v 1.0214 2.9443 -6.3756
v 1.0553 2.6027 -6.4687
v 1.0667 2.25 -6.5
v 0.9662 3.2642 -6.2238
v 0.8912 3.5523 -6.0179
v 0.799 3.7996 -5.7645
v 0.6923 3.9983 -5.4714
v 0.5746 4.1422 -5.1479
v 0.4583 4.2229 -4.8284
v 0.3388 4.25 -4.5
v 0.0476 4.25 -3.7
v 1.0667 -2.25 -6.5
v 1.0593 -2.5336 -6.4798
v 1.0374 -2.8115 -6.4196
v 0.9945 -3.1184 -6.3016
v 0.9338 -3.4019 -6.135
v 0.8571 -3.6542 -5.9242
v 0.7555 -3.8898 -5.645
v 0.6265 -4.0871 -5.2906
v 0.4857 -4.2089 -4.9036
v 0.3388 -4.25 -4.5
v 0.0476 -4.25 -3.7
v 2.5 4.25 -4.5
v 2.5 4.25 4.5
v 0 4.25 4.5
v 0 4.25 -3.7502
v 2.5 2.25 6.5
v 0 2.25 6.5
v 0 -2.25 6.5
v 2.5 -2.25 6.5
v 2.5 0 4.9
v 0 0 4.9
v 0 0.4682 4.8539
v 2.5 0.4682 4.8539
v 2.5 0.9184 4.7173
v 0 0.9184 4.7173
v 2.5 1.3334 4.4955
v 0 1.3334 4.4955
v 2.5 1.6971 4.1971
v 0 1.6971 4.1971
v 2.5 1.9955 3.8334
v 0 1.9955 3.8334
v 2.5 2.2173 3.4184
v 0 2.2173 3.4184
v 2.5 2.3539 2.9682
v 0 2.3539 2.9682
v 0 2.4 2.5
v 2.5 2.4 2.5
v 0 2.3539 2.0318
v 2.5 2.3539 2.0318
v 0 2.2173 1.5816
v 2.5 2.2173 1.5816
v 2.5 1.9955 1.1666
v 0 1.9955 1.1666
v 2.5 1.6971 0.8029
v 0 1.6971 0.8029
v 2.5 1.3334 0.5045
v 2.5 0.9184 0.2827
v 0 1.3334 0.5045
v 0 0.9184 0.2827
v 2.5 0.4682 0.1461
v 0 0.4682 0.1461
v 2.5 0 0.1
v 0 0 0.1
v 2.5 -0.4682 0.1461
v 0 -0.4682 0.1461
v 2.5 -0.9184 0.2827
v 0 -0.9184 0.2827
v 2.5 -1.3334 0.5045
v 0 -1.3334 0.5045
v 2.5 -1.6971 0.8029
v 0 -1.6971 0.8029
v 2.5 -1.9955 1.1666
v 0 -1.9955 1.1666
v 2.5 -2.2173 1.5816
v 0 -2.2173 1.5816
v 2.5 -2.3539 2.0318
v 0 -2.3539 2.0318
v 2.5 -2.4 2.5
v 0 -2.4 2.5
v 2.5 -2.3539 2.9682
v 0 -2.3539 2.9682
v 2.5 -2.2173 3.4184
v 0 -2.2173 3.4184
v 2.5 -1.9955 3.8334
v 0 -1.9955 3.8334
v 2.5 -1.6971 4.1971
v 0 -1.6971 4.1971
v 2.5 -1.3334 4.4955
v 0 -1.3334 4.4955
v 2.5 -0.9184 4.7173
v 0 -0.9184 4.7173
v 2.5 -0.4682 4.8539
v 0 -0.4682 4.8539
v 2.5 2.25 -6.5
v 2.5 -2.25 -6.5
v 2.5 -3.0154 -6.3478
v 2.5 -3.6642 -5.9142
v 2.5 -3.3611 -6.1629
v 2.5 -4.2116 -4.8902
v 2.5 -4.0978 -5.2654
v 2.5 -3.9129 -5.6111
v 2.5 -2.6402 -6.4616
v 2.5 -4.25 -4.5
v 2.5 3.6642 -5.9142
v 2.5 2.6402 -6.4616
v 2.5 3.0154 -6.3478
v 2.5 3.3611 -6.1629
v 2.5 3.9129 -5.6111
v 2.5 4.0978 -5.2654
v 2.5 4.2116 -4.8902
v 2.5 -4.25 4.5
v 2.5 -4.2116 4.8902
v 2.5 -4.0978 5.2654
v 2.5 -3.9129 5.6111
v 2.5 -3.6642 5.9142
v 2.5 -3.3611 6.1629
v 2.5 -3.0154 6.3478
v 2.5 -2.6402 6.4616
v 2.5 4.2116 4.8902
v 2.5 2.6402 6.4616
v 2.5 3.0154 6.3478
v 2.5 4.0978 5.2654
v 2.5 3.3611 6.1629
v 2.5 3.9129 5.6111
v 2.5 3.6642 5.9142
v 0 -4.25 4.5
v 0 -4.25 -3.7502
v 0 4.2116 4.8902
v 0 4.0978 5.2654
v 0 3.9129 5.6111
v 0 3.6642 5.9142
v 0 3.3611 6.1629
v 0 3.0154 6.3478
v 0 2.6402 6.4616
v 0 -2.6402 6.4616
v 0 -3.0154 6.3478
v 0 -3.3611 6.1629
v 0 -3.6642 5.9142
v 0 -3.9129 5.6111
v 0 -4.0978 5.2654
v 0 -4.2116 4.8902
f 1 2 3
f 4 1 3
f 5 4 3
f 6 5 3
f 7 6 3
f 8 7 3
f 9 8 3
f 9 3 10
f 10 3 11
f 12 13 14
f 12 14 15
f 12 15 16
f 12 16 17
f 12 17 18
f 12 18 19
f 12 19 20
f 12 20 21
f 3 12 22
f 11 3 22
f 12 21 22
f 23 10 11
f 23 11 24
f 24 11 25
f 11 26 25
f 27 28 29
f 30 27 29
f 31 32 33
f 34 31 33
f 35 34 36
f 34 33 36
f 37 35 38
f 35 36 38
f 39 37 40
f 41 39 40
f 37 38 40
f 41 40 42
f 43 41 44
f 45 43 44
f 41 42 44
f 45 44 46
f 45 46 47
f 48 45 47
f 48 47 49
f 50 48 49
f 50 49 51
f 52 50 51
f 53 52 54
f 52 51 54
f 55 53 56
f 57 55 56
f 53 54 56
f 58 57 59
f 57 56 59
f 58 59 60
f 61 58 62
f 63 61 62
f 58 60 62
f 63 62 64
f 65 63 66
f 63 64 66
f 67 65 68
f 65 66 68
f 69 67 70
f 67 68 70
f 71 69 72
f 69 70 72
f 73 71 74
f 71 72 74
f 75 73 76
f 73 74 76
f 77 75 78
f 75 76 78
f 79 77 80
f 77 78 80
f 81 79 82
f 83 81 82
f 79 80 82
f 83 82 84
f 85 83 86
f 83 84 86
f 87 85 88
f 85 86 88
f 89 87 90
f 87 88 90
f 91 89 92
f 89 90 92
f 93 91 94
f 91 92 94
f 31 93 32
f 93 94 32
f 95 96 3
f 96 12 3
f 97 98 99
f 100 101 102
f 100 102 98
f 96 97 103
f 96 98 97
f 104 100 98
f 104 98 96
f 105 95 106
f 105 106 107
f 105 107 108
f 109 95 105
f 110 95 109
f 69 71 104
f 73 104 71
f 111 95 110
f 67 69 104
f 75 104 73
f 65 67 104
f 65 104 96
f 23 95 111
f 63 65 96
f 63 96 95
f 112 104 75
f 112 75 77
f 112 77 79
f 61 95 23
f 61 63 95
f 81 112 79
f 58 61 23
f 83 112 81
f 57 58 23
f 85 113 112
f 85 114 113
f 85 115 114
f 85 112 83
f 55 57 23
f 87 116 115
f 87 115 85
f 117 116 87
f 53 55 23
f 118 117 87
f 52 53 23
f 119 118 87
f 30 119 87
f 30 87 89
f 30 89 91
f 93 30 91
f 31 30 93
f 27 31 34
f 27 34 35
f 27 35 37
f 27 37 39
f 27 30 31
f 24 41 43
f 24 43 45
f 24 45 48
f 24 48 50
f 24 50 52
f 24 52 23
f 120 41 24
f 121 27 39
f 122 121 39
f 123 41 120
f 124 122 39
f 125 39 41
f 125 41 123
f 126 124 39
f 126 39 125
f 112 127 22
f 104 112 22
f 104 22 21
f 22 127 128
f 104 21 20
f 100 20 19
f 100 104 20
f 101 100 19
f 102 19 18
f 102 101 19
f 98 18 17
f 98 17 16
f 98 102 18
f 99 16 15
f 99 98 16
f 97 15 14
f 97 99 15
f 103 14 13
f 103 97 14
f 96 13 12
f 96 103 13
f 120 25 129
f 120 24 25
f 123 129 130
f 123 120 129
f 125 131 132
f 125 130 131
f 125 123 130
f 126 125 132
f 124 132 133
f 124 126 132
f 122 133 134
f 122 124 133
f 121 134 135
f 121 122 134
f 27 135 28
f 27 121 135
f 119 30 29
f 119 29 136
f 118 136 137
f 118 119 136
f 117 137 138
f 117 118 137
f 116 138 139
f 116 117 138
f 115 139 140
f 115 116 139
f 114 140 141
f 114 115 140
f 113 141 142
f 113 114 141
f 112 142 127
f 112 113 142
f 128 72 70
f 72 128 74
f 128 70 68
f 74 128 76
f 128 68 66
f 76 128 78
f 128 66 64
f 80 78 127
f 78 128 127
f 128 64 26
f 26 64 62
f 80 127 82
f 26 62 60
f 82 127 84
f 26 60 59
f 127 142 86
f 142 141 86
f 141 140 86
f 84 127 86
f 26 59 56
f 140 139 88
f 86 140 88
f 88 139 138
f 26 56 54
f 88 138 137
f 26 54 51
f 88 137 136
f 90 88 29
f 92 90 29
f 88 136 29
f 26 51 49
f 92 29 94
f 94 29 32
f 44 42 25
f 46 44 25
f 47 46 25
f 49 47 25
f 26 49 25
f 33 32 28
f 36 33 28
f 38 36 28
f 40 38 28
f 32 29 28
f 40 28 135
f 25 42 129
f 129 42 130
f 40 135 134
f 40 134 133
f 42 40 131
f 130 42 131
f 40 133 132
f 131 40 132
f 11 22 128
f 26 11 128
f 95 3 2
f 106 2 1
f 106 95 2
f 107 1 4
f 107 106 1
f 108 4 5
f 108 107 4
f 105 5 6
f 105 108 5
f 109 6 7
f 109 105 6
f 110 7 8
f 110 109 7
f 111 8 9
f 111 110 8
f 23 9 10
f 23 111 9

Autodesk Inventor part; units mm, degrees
ref_plane "YZ Plane" through (0, 0, 0) normal (1, 0, 0) x (0, 1, 0)
ref_plane "XZ Plane" through (0, 0, 0) normal (0, 1, 0) x (-1, 0, 0)
ref_plane "XY Plane" through (0, 0, 0) normal (0, 0, 1) x (1, 0, 0)
sketch "Skizze1" plane through (0, 0, 0) normal (1, 0, 0) x (0, 1, 0)
  line L0 (-4.25, -6.5) -> (4.25, -6.5)
  line L1 (4.25, -6.5) -> (4.25, 6.5)
  line L2 (4.25, 6.5) -> (-4.25, 6.5)
  line L3 (-4.25, 6.5) -> (-4.25, -6.5)
  line L4 (-4.25, -6.5) -> (4.25, 6.5) construction
  line L5 (4.25, -6.5) -> (-4.25, 6.5) construction
  point P0 (0, 0)
  dimension "d0" = 8.5
  dimension "d1" = 13
extrude "Extrusion1" add sketch "Skizze1" along normal blind 2.5
sketch "Skizze3" plane through (0, 0, 0) normal (0, 1, 0) x (-1, 0, 0)
  line L0 (-1.0667, -6.5) -> (-0.0476, -3.7)
  line L1 (-0.0476, -3.7) -> (3.1717, -7.0921)
  line L2 (3.1717, -7.0921) -> (1.0847, -12.4156)
  line L3 (1.0847, -12.4156) -> (-1.0667, -6.5)
  line L4 (0, -6.5) -> (-2.5, -6.5) projected
  line L5 (0, -6.5) -> (0, 6.5) projected
  point P0 (0, 0)
  dimension "d11" = 2.8
  dimension "d12" = 20
extrude "Extrusion3" cut sketch "Skizze3" along normal mid plane 10.75
fillet "Rundung1" radius 2 4 edges at (1.25, 4.25, 6.5) (1.25, -4.25, 6.5) (1.7834, 4.25, -6.5) (1.7834, -4.25, -6.5)
sketch "Skizze2" plane through (0, 0, 0) normal (-1, 0, 0) x (0, 0, 1)
  circle A0 centre (2.5, 0) radius 2.4
  line L0 (6.5, 2.25) -> (6.5, -2.25) projected
  point P0 (0, 0)
  dimension "d6" = 4.8
  dimension "d13" = 4
extrude "Extrusion2" cut sketch "Skizze2" against normal blind 10.75
properties part number "P_PIN"
